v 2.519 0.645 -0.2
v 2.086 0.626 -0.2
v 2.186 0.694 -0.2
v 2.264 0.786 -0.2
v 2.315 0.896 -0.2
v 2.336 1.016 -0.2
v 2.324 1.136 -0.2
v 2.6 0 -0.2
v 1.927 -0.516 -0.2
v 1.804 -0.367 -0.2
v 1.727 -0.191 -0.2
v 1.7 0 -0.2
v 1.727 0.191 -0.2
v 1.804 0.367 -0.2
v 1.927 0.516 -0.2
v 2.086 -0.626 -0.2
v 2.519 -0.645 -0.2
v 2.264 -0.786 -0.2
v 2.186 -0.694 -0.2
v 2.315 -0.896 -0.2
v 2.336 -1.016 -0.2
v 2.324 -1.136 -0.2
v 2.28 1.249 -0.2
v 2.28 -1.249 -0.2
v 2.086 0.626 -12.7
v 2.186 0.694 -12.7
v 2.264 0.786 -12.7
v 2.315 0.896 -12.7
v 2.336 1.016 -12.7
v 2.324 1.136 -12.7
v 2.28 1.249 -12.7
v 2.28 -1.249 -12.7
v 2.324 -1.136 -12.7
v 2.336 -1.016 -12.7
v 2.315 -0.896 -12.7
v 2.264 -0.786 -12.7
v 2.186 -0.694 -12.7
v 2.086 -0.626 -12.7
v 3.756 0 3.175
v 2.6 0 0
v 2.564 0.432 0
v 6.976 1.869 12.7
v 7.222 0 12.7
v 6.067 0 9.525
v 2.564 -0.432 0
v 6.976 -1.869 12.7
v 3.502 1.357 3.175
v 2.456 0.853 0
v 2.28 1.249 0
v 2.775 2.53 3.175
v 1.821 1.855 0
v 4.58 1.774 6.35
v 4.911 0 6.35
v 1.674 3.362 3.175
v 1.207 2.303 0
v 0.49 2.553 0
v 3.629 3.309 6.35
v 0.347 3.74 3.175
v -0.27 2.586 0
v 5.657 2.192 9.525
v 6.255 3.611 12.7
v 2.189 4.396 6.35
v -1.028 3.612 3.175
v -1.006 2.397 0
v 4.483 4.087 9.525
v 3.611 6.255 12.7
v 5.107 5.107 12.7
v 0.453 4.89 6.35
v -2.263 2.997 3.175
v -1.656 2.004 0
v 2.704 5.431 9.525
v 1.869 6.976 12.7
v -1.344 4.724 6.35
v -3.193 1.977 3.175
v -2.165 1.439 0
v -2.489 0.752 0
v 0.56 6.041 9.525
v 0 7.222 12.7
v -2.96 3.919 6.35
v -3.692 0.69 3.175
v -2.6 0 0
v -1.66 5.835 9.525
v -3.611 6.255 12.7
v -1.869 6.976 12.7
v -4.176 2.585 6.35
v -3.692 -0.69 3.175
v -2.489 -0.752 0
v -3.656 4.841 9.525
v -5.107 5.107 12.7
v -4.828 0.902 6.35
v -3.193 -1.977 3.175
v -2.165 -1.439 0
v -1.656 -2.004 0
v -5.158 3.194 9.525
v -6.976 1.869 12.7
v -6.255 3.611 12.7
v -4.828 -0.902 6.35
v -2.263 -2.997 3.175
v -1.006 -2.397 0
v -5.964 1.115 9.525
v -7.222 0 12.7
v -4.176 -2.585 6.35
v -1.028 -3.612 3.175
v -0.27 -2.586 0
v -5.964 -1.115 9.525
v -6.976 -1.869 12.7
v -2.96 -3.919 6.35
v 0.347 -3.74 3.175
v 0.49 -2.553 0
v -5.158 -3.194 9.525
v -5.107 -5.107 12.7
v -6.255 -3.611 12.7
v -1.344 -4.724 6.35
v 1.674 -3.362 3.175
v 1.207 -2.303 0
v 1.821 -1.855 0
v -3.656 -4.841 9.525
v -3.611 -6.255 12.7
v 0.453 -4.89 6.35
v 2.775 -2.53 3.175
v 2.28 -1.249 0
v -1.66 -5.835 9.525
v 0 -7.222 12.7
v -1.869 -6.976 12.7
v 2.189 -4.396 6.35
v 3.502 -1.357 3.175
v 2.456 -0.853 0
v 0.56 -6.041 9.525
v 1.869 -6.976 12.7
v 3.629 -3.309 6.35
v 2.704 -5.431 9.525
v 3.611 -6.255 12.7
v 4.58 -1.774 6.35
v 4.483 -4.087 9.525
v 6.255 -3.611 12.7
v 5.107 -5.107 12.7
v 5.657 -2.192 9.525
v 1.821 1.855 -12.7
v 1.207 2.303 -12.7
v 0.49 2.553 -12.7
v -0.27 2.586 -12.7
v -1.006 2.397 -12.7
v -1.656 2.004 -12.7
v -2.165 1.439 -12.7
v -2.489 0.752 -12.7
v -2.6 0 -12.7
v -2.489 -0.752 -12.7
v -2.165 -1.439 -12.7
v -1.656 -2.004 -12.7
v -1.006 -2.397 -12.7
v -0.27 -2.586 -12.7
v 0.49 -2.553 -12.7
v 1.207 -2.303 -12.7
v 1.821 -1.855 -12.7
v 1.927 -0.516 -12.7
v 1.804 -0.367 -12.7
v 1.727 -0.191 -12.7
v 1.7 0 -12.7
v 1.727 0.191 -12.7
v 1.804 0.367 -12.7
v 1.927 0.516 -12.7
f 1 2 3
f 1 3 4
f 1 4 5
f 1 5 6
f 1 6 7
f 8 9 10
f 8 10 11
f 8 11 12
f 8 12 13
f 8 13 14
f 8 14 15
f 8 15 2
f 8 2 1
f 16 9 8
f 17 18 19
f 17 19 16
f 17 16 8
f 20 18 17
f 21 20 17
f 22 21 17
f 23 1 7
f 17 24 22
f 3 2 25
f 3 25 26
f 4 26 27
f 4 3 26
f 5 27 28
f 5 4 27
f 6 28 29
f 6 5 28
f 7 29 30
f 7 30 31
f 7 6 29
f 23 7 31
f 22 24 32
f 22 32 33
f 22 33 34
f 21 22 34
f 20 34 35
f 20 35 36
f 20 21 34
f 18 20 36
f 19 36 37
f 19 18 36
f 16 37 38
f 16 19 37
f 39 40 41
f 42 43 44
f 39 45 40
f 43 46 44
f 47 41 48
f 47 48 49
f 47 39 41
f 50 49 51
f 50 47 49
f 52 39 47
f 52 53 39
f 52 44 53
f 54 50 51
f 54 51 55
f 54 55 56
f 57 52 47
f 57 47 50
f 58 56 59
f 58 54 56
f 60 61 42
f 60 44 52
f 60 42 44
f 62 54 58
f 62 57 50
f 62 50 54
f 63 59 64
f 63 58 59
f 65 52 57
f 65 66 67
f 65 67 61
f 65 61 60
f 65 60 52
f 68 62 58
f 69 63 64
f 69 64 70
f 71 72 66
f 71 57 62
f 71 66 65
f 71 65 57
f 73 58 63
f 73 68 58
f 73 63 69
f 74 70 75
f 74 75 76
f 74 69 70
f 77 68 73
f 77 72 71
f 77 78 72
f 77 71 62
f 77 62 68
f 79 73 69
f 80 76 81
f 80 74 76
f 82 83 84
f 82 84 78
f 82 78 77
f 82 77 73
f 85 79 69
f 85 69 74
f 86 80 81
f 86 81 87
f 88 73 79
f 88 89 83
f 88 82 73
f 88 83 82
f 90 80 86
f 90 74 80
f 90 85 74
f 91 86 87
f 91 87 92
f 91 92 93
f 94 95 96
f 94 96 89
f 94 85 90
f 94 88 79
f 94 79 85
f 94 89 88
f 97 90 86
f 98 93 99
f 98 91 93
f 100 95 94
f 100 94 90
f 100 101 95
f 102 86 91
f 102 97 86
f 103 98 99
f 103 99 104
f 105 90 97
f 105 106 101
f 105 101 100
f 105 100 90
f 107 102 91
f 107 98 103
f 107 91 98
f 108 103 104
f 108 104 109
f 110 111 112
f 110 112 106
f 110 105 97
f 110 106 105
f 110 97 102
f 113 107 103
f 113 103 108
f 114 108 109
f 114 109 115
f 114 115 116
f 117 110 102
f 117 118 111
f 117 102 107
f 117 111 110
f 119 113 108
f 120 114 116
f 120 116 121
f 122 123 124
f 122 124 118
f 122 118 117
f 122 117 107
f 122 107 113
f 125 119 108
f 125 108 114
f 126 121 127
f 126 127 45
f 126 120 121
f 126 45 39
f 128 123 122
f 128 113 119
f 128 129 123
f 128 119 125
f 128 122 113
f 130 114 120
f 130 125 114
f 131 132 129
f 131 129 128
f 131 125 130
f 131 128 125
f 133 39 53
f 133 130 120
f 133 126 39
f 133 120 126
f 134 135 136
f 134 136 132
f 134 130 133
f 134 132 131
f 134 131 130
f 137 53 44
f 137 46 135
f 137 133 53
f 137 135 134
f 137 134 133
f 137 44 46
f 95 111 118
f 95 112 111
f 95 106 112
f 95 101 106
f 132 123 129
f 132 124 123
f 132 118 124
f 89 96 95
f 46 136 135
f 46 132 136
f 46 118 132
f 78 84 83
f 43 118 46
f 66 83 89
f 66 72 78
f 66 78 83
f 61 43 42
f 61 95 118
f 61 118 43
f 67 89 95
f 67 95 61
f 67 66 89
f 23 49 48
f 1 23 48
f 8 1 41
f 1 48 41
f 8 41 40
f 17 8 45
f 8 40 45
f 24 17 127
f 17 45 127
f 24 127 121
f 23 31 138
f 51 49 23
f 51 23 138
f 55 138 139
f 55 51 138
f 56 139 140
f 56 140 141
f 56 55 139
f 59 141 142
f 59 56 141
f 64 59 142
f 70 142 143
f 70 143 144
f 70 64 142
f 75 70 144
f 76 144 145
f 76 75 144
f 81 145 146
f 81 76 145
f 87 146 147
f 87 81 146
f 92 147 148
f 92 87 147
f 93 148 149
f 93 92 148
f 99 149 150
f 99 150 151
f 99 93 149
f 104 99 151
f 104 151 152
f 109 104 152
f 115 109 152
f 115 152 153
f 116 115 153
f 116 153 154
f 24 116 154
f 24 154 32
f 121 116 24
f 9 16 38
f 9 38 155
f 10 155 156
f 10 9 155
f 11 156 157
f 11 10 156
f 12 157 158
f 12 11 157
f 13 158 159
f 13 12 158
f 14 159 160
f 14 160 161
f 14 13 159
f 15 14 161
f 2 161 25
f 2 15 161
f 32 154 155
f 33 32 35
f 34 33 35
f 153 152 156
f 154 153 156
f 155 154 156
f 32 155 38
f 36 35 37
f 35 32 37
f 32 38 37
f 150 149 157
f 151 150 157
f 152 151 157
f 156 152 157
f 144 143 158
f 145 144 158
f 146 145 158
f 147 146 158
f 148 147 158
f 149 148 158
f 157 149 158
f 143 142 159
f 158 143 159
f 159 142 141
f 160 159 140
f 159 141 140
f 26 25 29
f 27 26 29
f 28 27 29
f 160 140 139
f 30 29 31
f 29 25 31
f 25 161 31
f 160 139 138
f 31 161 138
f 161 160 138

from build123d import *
from build123d import SkipClean  # not in build123d's __all__

# Parameters (mm, degrees)
F1_DEPTH = 12.7
F2_R     = 2.6
F3_DEPTH = 12.7
F3_TAPER = -20
F6_DEPTH = 0.2


with BuildPart() as f1:
    # F0 (on Top) → F1 (new body)
    with BuildSketch(Plane.XY):
        with BuildLine():
            ThreePointArc((2.0857885615, 0.6255167239), (2.315451032, 0.8961675136), (2.2801491146, 1.2493678462))
            ThreePointArc((2.2801491146, 1.2493678462), (-2.6, 0), (2.2801491146, -1.2493678462))
            ThreePointArc((2.2801491146, -1.2493678462), (2.315451032, -0.8961675136), (2.0857885615, -0.6255167239))
            ThreePointArc((2.0857885615, -0.6255167239), (1.7, 0), (2.0857885615, 0.6255167239))
        make_face()
    extrude(amount=-F1_DEPTH)

    # F2 (on Top) → F3 (join)
    with BuildSketch(Plane.XY):
        Circle(F2_R)
    extrude(amount=F3_DEPTH, taper=F3_TAPER)

    # F5 (on face) → F6 (join)
    with BuildSketch(Plane(origin=(0, 0, 0), x_dir=(1, 0, 0), z_dir=(0, 0, -1))):
        with BuildLine():
            ThreePointArc((2.2801491146, 1.2493678462), (2.315451032, 0.8961675136), (2.0857885615, 0.6255167239))
            ThreePointArc((2.0857885615, 0.6255167239), (1.7, 0), (2.0857885615, -0.6255167239))
            ThreePointArc((2.0857885615, -0.6255167239), (2.315451032, -0.8961675136), (2.2801491146, -1.2493678462))
            ThreePointArc((2.2801491146, -1.2493678462), (2.6, 0), (2.2801491146, 1.2493678462))
        make_face()
    with SkipClean():  # cleaning this boolean's faces spoils the solid; the shape is the same uncleaned
        extrude(amount=F6_DEPTH)


solid = f1.part
